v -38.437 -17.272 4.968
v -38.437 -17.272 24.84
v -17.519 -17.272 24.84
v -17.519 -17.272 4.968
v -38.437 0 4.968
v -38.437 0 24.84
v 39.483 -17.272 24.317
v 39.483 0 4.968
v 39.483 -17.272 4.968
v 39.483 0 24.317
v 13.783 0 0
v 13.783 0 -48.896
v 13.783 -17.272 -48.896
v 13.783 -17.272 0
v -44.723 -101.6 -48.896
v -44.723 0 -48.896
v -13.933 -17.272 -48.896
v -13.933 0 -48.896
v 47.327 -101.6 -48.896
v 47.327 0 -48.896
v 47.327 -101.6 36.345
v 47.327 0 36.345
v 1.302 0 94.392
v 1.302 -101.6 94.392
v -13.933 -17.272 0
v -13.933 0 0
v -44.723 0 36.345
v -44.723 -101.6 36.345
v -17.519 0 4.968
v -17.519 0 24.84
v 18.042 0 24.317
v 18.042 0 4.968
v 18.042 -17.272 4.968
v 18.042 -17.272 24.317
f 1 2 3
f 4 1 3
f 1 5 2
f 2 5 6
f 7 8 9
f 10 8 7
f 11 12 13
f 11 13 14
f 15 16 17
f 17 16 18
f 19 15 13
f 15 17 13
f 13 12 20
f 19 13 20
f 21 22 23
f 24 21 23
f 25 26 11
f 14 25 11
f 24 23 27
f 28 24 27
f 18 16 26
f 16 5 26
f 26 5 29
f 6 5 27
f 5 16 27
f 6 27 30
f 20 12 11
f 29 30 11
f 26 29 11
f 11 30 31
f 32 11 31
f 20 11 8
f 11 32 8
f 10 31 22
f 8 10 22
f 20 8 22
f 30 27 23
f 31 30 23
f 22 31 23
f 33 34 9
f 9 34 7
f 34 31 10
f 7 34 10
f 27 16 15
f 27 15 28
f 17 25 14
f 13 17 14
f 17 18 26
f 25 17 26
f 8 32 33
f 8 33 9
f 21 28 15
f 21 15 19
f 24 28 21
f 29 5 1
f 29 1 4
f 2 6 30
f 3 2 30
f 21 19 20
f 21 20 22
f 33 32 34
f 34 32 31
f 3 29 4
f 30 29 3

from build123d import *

# Parameters (mm, degrees)
F0_W     = 92.0496
F0_H     = 85.240435
F2_DEPTH = 101.6
F1_W     = 21.440845
F1_H     = 19.349056
F1_W_2   = 20.917898
F1_H_2   = 19.872003
F1_W_3   = 27.716208
F1_H_3   = 48.895583
F3_DEPTH = 17.272


with BuildPart() as f2:
    # F0 (on Front) → F2 (new body)
    with BuildSketch(Plane.XZ):
        Polygon((1.30194, 94.392009), (-44.72286, 36.344852), (47.32674, 36.344852), align=None)
        with Locations((1.30194, -6.275365)):
            Rectangle(F0_W, F0_H)
    extrude(amount=F2_DEPTH)

    # F1 (on Front) → F3 (cut)
    with BuildSketch(Plane.XZ):
        with Locations((28.762107, 14.642532)):
            Rectangle(F1_W, F1_H)
        with Locations((-27.977687, 14.904006)):
            Rectangle(F1_W_2, F1_H_2)
        with Locations((-0.075163, -24.447791)):
            Rectangle(F1_W_3, F1_H_3)
    extrude(amount=F3_DEPTH, mode=Mode.SUBTRACT)


solid = f2.part
